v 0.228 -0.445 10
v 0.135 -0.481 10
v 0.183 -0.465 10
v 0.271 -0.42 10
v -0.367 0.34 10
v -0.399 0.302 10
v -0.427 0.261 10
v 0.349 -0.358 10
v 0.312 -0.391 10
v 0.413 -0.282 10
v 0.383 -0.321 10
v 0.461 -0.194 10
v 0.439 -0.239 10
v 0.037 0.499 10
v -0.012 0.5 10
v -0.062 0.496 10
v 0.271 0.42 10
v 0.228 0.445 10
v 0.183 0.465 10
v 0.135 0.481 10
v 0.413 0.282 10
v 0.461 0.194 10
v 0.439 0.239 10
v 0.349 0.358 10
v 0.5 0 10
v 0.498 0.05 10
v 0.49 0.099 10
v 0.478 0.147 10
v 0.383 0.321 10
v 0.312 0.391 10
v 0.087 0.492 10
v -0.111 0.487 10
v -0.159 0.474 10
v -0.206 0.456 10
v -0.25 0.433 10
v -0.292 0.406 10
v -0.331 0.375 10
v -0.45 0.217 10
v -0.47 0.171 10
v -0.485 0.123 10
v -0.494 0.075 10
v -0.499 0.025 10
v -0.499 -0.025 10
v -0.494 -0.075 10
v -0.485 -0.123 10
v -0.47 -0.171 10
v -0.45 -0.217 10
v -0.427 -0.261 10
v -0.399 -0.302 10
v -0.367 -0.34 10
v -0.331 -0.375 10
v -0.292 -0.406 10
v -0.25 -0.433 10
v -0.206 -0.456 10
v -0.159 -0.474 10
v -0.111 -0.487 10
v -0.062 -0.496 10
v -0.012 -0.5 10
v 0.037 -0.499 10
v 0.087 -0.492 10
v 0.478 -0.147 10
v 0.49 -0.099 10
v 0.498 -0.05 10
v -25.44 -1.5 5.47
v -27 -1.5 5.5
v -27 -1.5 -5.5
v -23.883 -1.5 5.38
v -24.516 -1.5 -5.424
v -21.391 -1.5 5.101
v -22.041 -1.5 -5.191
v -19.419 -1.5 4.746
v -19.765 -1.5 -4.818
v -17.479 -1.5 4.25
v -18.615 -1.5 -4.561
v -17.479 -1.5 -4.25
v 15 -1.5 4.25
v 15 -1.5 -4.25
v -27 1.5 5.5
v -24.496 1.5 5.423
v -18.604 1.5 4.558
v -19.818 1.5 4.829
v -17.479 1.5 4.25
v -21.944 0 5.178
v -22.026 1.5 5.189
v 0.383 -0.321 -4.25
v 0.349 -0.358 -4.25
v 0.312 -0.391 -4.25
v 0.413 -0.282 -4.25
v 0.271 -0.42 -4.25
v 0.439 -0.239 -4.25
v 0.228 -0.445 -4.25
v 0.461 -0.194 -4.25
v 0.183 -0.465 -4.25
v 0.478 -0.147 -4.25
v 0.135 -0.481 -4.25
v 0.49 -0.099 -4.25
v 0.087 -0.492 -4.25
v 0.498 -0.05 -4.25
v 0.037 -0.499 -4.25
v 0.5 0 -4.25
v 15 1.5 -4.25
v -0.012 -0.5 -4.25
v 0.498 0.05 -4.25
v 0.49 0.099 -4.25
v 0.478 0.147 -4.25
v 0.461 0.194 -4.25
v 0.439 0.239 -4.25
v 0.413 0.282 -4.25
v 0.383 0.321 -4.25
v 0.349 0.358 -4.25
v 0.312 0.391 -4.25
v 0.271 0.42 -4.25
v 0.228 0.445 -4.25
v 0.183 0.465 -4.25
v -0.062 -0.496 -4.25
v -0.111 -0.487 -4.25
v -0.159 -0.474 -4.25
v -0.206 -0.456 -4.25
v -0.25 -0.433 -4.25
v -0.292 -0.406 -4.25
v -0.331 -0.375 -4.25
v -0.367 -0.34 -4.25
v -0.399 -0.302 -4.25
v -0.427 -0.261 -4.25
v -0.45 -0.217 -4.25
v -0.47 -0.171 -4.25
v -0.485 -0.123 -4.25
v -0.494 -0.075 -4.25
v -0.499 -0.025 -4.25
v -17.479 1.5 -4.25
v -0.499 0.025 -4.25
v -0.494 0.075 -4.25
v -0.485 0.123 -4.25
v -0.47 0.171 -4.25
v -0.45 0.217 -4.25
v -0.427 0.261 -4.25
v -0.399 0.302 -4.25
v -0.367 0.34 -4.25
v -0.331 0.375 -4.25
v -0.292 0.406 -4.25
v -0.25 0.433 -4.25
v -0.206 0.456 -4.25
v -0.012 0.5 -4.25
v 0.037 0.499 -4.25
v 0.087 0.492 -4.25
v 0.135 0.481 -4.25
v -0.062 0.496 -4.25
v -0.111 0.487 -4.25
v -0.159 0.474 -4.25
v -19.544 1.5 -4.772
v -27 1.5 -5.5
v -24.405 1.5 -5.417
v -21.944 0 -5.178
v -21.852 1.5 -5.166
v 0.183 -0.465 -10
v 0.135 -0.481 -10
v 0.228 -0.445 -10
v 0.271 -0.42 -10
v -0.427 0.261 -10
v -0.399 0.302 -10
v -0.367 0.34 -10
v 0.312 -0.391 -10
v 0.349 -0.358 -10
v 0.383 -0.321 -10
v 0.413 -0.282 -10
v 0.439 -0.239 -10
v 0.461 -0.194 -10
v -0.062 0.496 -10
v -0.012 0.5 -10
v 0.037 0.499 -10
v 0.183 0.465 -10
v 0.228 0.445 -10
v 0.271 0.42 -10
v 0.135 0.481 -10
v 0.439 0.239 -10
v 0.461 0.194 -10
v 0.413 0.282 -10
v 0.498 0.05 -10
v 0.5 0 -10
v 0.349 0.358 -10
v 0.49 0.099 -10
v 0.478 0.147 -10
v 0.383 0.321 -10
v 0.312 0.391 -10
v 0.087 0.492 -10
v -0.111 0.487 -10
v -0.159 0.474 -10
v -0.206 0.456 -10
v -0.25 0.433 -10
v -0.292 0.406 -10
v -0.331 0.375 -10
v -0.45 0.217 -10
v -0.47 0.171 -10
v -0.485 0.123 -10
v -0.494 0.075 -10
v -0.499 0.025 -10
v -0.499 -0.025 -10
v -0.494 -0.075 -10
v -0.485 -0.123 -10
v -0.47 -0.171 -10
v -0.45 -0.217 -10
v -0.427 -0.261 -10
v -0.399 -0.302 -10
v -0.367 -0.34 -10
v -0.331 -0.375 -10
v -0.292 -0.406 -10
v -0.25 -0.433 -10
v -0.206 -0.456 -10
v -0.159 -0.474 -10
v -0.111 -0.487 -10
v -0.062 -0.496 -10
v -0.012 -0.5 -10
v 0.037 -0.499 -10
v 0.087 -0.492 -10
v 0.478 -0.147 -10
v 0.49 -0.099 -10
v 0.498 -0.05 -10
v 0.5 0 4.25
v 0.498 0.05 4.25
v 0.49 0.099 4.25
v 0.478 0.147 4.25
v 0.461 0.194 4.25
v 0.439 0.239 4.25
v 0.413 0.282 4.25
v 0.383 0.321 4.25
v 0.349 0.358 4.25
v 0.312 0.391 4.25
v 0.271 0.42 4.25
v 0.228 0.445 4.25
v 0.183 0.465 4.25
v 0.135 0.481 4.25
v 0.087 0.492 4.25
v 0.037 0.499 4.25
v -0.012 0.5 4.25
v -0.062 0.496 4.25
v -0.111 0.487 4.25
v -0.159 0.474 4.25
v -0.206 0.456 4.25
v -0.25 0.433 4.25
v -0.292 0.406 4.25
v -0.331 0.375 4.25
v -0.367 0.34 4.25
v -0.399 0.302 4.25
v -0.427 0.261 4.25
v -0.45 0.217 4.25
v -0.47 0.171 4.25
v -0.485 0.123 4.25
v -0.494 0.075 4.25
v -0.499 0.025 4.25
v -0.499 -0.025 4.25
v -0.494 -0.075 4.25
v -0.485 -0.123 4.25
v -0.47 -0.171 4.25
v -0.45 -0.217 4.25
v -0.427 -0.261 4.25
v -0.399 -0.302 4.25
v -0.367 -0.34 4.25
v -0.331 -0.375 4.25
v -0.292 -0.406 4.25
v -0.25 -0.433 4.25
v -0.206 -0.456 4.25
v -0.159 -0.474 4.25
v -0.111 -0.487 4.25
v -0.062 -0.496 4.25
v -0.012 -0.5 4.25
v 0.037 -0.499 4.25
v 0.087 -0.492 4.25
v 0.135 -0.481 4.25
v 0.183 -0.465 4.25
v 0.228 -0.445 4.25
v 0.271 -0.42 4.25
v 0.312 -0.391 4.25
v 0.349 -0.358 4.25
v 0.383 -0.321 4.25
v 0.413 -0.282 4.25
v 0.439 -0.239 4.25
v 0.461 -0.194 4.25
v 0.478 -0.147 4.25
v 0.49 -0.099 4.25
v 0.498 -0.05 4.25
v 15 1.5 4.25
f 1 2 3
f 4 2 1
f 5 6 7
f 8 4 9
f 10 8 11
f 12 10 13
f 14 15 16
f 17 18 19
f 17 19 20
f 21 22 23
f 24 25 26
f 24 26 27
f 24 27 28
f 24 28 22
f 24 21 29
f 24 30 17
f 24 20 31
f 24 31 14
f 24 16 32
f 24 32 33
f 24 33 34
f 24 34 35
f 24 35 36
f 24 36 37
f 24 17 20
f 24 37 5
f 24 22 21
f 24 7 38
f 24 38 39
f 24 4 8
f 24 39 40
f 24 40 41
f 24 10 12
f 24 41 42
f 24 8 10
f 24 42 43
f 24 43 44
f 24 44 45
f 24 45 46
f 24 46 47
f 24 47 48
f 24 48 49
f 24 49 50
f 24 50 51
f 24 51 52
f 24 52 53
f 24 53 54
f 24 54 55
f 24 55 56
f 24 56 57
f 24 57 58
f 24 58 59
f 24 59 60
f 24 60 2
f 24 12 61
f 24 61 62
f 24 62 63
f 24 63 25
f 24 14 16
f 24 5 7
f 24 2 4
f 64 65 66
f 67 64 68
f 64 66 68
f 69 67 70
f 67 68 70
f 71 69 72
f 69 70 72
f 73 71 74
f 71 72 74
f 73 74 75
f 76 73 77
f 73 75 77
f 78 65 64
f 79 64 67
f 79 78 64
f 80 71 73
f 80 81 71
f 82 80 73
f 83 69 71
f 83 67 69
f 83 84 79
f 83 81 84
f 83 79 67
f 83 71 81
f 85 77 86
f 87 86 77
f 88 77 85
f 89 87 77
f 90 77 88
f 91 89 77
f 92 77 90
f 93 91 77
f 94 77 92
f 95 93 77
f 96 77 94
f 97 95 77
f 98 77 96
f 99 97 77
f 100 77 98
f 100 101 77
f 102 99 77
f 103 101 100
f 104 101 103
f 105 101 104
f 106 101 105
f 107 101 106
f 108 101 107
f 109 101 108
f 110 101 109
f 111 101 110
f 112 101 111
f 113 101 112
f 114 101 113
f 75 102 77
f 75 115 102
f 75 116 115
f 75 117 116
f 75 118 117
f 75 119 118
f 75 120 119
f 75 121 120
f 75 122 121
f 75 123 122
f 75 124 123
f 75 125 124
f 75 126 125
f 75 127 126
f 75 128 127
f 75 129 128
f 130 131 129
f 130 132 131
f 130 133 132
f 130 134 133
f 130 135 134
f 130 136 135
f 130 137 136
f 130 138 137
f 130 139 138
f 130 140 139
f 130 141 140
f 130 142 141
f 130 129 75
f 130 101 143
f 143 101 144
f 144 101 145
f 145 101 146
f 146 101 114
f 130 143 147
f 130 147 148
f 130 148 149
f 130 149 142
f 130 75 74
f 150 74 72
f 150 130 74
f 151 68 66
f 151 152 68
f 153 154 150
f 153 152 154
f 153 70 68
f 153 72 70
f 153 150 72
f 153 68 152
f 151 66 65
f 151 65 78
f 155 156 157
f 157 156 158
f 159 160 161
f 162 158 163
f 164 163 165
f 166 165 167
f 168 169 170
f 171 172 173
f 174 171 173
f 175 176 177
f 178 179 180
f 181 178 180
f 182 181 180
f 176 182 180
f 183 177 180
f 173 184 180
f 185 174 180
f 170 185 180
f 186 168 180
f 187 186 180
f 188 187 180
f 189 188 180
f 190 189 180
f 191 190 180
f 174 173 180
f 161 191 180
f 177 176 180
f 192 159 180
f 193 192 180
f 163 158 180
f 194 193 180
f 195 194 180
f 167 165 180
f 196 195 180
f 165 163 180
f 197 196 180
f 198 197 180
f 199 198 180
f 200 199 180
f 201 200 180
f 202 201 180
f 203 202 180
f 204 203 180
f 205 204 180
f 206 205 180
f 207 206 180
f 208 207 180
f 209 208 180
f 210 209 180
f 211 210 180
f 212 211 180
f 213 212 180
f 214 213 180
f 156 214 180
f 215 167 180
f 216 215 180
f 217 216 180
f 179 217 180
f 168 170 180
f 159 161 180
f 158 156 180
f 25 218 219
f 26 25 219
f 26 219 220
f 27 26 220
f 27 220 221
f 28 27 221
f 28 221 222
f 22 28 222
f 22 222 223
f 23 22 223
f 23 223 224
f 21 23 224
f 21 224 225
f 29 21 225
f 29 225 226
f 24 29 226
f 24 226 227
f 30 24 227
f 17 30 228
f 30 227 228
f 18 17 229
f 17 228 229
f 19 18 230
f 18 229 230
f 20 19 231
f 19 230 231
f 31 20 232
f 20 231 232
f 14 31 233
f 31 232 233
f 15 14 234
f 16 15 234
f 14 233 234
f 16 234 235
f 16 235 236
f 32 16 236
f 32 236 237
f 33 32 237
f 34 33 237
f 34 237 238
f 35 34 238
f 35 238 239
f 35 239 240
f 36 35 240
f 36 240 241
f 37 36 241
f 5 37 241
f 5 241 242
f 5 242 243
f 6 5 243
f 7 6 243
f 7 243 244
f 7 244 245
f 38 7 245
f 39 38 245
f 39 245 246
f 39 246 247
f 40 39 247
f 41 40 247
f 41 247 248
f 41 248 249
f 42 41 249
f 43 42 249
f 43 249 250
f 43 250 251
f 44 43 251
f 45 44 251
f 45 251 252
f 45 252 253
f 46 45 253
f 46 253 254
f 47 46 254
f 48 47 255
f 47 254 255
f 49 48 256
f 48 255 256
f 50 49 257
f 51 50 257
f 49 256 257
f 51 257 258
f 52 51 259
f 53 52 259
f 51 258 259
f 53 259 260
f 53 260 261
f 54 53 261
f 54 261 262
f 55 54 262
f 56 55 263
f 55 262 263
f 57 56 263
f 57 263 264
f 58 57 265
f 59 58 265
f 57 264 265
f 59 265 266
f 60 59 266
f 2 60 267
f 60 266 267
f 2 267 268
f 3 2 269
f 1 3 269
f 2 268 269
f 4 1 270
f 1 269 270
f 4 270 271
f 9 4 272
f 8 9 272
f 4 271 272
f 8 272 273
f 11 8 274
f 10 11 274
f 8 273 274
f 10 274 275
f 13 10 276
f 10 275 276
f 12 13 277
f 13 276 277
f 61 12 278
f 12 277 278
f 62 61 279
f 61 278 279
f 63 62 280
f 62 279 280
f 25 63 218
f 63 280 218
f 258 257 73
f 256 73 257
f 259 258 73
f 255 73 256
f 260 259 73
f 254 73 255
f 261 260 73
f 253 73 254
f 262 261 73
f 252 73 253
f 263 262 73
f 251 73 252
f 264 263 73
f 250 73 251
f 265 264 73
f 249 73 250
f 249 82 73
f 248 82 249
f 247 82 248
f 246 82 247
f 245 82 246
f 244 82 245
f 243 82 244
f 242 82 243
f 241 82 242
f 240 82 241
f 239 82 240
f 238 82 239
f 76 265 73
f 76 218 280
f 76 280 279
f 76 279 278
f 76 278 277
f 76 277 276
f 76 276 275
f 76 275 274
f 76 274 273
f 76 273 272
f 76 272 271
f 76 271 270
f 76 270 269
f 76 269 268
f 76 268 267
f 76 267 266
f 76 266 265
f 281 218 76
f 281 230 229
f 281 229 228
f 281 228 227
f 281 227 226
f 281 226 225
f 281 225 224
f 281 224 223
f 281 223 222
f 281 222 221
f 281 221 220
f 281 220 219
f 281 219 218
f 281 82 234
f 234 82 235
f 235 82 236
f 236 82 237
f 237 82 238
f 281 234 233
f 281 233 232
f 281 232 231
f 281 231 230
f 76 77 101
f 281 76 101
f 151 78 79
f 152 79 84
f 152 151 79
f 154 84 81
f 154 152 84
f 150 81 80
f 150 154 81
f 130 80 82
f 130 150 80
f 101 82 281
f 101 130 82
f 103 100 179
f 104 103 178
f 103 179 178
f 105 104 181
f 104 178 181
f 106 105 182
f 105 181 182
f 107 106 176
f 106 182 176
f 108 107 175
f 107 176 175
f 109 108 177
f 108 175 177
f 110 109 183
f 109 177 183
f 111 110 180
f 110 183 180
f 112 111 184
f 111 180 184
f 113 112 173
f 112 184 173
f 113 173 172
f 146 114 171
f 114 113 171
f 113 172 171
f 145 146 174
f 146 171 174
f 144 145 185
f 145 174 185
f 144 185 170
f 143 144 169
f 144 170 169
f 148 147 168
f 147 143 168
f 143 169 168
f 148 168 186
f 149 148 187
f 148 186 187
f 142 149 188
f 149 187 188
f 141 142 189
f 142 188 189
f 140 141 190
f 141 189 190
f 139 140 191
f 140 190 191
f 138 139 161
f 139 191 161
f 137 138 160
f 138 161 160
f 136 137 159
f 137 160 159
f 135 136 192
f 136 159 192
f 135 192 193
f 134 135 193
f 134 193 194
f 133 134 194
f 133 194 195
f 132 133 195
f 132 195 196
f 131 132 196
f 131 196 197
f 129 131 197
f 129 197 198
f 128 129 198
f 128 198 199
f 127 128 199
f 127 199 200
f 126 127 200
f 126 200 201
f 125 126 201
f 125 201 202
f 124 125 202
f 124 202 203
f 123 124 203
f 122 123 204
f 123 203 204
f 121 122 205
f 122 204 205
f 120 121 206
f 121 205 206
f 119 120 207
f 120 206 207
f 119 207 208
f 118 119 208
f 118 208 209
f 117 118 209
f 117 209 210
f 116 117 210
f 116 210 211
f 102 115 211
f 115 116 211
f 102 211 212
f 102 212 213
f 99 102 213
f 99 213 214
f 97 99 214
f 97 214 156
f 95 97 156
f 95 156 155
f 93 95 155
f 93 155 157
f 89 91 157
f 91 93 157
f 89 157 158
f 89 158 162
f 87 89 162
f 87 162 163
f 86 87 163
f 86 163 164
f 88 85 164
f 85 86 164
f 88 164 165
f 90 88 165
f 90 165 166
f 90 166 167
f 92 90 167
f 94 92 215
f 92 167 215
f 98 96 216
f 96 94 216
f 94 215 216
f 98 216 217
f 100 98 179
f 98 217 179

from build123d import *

# Parameters (mm, degrees)
BOSS_EXTRUDE1_DEPTH      = 5.5
BOSS_EXTRUDE1_DEPTH_BACK = 5.5
SKETCH1_W                = 42
SKETCH1_H                = 3
SKETCH2_OUTSIDE_W        = 52.704
SKETCH2_OUTSIDE_H        = 21.704
CUT_EXTRUDE1_DEPTH       = 28.717323103
BOSS_EXTRUDE2_DEPTH      = 10
BOSS_EXTRUDE2_DEPTH_BACK = 10
SKETCH3_R                = 0.5


with BuildPart() as part:
    # Sketch1 → Boss-Extrude1 (new, two sides: drawn at the far end of the back side and taken through both)
    with BuildSketch(Plane.XY.offset(-BOSS_EXTRUDE1_DEPTH_BACK)):
        with Locations((-6, 0)):
            Rectangle(SKETCH1_W, SKETCH1_H)
    extrude(amount=BOSS_EXTRUDE1_DEPTH + BOSS_EXTRUDE1_DEPTH_BACK)

    # Sketch2 outside → Cut-Extrude1 (cut, through all)
    with BuildSketch(Plane(origin=(0, 1.5, 0), x_dir=(1, 0, 0), z_dir=(0, 1, 0))):
        with Locations((-6, 0)):
            Rectangle(SKETCH2_OUTSIDE_W, SKETCH2_OUTSIDE_H)
        with BuildLine():
            Line((15, -4.25), (15, 4.25))
            Line((15, 4.25), (-17.478927243, 4.25))
            add(Edge.make_bspline(
                [(-17.478927243, 4.25), (-21.629138445, 5.5), (-27, 5.5)],
                knots=[0.883126675, 0.883126675, 0.883126675, 1.570796327, 1.570796327, 1.570796327], degree=2, weights=[1, 0.941468872, 1]))
            Line((-27, 5.5), (-27, -5.5))
            add(Edge.make_bspline(
                [(-27, -5.5), (-21.629138445, -5.5), (-17.478927243, -4.25)],
                knots=[4.71238898, 4.71238898, 4.71238898, 5.400058632, 5.400058632, 5.400058632], degree=2, weights=[1, 0.941468872, 1]))
            Line((-17.478927243, -4.25), (15, -4.25))
        make_face(mode=Mode.SUBTRACT)
    extrude(amount=-CUT_EXTRUDE1_DEPTH, mode=Mode.SUBTRACT)

    # Sketch3 → Boss-Extrude2 (add, two sides: drawn at the far end of the back side and taken through both)
    with BuildSketch(Plane.XY.offset(-BOSS_EXTRUDE2_DEPTH_BACK)):
        Circle(SKETCH3_R)
    extrude(amount=BOSS_EXTRUDE2_DEPTH + BOSS_EXTRUDE2_DEPTH_BACK)


solid = part.part
